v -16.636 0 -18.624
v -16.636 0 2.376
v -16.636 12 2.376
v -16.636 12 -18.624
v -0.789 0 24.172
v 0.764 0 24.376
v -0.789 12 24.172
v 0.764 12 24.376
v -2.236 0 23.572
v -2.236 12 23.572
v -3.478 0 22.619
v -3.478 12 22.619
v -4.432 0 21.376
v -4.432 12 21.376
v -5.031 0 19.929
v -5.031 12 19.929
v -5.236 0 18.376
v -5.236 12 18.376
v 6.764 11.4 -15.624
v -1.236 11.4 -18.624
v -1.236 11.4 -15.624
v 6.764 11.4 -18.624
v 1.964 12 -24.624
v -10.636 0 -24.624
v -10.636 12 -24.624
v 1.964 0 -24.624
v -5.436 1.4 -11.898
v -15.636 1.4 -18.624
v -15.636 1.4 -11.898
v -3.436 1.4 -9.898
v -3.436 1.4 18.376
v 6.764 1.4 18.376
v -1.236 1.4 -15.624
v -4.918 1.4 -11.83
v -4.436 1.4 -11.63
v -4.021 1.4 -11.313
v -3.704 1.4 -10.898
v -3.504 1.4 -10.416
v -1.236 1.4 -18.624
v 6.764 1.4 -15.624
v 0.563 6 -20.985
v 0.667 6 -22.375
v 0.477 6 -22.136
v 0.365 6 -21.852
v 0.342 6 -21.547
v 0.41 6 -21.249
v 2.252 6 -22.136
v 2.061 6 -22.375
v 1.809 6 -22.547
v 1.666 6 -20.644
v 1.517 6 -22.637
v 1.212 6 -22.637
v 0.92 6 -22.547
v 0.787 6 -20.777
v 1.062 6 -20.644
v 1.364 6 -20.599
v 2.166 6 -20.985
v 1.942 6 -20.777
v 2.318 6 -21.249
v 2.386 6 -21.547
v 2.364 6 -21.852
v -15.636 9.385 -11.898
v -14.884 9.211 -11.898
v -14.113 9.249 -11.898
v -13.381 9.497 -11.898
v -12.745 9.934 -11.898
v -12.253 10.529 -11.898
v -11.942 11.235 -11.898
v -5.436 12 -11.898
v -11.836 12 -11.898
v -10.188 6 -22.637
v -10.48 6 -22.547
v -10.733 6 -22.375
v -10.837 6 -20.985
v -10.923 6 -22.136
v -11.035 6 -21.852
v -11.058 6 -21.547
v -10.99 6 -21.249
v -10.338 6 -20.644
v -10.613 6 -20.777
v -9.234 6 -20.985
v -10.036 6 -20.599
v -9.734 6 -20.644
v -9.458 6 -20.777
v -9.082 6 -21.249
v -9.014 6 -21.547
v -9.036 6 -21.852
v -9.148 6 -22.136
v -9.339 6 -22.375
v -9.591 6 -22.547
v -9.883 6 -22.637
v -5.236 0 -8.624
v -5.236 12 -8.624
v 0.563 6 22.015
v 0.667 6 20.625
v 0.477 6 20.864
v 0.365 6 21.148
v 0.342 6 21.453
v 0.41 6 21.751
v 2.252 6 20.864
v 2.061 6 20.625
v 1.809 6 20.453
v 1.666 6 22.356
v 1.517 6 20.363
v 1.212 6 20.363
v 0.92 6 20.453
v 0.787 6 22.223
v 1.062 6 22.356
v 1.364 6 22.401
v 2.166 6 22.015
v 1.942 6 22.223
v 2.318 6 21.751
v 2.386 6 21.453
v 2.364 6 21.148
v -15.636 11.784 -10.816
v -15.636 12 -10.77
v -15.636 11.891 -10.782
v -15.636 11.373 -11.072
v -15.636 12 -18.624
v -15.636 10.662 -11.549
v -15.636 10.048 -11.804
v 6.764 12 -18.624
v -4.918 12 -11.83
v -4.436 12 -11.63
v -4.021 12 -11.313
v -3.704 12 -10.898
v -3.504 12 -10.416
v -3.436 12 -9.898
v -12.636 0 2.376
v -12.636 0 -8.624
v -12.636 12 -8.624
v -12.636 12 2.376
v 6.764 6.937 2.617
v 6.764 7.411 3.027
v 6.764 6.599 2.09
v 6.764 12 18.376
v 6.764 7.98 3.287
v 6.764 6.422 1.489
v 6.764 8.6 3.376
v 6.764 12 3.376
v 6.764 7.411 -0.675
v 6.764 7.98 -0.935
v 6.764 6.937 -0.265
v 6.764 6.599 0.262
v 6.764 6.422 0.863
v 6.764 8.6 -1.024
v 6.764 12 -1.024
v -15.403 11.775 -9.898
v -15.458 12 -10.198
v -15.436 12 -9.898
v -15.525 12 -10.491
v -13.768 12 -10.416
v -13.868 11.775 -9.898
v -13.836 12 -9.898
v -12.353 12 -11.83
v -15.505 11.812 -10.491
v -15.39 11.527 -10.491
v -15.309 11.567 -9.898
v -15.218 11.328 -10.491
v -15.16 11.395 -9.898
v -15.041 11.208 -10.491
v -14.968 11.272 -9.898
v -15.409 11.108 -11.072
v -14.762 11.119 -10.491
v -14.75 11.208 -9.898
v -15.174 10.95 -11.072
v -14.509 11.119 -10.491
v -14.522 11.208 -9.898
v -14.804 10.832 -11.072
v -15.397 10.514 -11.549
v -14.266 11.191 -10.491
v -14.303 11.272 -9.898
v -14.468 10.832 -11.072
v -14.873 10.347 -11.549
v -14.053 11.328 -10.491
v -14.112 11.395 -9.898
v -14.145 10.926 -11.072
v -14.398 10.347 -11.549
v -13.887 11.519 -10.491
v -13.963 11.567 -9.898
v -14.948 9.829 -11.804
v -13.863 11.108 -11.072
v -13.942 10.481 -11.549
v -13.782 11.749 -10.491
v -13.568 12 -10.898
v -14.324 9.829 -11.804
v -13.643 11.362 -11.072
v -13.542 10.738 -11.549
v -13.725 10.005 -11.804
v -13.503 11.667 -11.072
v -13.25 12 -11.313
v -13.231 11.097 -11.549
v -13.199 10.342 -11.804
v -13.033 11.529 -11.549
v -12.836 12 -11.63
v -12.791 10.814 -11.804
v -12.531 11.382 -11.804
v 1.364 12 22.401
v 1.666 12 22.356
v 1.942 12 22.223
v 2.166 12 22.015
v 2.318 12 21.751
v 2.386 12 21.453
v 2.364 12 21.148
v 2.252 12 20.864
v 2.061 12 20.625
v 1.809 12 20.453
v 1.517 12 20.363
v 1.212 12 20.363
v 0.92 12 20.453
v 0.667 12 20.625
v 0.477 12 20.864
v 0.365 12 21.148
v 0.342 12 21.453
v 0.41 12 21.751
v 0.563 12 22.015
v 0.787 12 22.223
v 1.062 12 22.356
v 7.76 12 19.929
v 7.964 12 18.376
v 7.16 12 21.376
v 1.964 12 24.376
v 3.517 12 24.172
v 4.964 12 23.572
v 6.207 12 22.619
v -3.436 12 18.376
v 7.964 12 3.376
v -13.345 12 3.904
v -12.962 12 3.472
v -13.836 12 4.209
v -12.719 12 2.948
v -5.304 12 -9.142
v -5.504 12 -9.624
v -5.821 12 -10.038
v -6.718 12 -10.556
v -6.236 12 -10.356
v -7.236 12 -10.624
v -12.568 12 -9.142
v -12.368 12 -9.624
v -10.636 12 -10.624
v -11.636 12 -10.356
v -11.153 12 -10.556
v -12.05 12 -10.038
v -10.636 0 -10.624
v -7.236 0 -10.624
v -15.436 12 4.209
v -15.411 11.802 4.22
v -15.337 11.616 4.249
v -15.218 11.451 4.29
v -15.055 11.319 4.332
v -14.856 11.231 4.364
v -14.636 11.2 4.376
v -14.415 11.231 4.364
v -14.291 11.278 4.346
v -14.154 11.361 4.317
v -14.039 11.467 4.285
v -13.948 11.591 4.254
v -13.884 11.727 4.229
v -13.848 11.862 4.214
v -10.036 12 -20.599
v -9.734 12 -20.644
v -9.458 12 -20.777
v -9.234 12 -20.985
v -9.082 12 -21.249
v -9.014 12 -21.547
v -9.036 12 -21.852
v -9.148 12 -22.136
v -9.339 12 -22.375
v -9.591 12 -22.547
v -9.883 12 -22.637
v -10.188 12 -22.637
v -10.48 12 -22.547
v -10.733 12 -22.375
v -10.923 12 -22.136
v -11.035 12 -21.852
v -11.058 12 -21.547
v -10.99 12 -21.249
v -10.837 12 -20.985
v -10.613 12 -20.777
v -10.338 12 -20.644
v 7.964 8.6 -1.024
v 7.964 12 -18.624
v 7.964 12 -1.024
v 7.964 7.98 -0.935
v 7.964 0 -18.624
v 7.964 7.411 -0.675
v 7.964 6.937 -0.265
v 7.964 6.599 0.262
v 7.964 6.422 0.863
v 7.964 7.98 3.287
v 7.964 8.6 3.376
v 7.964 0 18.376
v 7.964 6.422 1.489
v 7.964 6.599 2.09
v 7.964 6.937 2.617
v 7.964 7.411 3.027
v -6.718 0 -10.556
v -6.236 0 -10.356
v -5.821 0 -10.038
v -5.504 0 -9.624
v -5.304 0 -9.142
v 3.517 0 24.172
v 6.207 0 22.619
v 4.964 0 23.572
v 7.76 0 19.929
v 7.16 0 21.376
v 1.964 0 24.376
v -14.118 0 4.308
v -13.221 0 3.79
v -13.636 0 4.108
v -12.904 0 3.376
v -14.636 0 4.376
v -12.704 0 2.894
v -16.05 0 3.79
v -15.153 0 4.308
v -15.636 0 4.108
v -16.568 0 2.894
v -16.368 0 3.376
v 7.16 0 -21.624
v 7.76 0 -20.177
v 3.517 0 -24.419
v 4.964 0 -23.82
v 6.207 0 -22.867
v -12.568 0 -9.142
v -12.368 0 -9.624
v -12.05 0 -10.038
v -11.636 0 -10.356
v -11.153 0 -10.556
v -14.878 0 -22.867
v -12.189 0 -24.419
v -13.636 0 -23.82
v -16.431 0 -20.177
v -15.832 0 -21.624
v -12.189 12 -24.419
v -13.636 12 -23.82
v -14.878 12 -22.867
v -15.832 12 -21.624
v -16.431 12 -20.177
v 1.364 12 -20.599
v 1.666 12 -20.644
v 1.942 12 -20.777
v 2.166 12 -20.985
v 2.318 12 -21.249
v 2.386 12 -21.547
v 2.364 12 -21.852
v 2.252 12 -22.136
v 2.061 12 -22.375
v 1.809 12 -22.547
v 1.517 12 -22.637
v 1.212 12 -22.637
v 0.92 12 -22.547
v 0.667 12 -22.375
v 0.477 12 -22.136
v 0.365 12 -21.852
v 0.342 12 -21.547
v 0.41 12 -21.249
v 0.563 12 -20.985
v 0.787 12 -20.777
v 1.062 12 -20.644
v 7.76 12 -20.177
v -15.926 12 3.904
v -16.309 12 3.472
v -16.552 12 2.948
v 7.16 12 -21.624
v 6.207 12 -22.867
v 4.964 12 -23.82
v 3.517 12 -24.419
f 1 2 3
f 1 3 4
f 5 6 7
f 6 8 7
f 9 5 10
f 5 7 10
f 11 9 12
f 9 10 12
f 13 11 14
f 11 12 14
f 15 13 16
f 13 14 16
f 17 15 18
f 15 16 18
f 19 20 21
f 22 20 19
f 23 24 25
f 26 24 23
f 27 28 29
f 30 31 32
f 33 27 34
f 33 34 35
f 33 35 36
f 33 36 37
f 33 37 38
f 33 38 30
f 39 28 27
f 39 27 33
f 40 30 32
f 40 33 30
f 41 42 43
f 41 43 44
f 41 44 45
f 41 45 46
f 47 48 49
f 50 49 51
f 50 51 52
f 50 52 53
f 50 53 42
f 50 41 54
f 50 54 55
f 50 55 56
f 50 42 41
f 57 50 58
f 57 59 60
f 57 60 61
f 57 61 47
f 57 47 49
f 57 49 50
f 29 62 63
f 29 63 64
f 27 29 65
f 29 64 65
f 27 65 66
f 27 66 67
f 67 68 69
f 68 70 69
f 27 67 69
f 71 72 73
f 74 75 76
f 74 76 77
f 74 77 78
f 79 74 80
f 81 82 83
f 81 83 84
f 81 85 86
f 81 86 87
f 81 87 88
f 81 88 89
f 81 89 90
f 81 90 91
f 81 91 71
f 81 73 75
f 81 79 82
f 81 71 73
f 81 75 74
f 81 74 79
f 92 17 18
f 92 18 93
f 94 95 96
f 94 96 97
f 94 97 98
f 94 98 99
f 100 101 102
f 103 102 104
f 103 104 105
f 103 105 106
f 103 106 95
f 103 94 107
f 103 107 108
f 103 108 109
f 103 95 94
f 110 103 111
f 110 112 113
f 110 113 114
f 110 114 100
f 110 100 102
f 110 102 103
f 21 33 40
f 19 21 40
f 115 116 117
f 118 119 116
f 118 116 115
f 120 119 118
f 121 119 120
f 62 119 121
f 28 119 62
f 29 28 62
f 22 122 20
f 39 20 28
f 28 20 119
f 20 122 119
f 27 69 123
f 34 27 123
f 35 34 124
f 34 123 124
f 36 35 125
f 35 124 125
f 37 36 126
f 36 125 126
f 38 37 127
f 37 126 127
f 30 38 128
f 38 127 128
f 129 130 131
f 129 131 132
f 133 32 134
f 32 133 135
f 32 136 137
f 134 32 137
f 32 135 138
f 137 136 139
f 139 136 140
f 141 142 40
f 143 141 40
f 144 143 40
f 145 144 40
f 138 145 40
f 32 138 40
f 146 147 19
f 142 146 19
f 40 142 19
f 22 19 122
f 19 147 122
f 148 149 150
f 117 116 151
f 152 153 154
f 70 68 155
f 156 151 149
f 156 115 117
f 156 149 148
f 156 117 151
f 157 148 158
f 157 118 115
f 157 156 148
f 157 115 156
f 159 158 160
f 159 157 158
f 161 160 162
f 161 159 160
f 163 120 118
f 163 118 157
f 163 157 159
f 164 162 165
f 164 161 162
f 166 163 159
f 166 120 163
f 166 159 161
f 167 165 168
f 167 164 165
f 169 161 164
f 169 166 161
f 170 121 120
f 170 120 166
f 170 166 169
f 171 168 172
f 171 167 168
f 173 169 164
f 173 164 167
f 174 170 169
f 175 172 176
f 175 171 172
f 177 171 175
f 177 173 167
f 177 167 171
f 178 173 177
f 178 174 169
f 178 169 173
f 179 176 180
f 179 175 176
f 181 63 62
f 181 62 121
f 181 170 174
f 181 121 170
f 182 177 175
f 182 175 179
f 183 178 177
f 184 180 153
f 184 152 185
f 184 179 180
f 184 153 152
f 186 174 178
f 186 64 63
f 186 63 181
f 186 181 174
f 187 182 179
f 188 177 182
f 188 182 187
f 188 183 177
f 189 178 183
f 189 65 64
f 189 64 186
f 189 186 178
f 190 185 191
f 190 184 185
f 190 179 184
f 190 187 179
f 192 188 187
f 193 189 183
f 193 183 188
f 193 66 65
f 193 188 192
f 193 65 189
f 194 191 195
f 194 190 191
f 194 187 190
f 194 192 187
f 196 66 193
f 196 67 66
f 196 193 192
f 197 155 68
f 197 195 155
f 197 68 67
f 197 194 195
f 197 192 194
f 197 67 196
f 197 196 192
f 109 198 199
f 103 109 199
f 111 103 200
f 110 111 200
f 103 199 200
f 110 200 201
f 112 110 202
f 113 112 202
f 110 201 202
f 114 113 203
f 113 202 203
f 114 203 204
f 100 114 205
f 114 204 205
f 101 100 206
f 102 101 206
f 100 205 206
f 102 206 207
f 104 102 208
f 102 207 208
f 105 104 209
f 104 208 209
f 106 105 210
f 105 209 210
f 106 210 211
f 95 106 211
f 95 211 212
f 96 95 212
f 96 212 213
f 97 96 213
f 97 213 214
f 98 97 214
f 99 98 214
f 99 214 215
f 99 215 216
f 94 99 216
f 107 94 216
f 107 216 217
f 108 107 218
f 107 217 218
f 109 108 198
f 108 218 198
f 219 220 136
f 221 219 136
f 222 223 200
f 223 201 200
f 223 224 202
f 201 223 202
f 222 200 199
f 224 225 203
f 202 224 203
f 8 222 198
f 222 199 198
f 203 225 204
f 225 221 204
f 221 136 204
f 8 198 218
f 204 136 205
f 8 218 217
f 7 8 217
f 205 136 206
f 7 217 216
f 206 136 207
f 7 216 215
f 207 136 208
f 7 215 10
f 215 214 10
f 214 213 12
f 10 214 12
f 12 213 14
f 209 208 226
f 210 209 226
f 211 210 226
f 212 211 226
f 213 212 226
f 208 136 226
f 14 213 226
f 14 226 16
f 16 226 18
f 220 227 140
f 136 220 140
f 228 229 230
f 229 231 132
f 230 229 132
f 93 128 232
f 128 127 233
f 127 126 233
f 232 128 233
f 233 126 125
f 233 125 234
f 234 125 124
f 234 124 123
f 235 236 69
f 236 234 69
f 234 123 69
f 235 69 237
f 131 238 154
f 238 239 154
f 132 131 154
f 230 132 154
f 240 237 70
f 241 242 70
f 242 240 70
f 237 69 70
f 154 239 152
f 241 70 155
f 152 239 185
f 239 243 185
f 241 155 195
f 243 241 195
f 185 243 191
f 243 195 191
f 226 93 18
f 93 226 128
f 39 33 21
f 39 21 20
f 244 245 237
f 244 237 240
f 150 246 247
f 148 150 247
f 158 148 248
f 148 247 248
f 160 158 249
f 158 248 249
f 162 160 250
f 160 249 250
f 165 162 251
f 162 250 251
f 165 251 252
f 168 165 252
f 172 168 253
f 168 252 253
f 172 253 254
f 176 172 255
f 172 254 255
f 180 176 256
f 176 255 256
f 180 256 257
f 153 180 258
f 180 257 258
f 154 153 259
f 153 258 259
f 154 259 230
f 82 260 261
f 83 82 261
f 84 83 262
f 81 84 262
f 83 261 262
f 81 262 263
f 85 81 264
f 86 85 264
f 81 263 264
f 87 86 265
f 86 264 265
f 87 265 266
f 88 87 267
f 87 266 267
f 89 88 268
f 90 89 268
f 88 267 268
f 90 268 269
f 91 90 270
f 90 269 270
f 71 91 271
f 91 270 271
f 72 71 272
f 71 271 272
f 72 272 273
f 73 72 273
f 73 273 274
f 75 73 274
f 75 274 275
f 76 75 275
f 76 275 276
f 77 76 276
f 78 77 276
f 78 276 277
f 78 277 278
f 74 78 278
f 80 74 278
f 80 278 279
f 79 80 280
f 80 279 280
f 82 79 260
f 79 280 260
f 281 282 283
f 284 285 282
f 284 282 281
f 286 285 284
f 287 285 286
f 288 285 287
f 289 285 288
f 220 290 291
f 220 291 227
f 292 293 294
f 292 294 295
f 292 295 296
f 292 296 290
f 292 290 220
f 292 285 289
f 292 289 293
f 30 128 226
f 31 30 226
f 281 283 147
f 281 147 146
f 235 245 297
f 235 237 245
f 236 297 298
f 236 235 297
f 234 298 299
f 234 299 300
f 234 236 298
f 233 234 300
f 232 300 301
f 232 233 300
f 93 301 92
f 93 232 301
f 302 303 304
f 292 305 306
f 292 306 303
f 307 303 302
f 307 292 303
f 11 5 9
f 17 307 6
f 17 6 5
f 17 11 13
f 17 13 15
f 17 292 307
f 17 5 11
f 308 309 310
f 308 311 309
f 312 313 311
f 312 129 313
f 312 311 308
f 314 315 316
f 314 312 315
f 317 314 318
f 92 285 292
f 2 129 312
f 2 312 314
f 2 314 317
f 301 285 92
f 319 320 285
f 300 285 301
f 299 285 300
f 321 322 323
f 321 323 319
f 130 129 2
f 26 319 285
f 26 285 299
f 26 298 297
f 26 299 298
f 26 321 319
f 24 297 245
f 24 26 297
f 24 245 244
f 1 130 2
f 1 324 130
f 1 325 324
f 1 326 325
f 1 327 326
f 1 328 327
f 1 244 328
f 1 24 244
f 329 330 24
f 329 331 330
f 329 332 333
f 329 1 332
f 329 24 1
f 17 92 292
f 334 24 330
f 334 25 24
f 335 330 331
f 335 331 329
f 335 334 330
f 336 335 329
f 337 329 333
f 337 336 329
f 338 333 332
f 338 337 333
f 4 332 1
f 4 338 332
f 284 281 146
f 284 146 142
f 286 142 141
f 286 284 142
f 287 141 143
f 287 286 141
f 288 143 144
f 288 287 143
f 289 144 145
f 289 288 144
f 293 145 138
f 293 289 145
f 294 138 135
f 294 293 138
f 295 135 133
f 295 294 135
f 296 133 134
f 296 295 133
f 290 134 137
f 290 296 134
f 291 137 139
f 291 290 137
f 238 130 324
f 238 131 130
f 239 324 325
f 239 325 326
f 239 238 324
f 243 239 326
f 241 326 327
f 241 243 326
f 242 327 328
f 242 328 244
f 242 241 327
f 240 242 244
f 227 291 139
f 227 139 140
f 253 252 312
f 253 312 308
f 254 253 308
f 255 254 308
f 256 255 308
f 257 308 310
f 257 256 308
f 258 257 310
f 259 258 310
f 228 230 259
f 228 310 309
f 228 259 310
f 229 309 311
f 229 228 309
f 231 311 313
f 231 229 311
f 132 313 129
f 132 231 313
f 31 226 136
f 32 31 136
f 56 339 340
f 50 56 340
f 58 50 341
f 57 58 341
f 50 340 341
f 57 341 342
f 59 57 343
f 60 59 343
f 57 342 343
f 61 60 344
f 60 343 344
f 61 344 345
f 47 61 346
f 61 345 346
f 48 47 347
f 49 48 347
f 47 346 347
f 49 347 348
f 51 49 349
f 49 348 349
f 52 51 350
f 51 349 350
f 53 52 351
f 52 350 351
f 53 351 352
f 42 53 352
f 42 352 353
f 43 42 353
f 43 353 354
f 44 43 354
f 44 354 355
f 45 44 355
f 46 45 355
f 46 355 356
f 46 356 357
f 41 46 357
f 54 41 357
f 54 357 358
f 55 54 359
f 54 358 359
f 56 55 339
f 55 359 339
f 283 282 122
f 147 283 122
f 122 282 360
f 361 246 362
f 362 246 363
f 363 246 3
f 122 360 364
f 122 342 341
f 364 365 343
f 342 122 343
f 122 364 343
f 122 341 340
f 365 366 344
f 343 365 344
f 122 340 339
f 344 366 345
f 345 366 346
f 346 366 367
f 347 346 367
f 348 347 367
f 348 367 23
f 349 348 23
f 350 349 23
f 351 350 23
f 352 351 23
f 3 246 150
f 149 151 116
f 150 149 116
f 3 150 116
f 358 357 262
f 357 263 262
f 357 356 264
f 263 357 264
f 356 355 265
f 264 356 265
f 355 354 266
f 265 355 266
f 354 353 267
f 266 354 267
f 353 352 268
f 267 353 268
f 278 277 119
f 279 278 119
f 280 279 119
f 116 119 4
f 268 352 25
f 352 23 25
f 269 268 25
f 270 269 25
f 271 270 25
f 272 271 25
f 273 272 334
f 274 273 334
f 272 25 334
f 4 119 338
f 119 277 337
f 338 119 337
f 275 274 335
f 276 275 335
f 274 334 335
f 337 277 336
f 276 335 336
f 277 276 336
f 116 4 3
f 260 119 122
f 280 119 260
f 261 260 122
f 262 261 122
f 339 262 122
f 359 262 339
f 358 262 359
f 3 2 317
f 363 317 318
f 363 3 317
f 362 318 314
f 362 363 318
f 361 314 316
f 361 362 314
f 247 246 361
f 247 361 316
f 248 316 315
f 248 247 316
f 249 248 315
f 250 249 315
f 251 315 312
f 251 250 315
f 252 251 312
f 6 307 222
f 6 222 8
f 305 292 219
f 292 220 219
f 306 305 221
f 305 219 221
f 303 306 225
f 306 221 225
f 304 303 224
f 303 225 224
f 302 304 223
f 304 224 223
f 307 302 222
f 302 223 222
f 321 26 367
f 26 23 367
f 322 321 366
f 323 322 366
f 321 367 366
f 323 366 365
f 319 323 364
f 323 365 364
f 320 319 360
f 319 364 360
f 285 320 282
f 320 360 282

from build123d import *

# Parameters (mm, degrees)
BOSS_EXTRUDE1_DEPTH = 12
CUT_EXTRUDE1_DEPTH  = 10.6
SKETCH3_R           = 0.8
CUT_EXTRUDE2_DEPTH  = 16.274572476
SKETCH4_R           = 1.025
CUT_EXTRUDE3_DEPTH  = 6
FILLET1_R           = 6
FILLET2_R           = 2
CUT_EXTRUDE4_DEPTH  = 1.2
FILLET3_R           = 2
SKETCH6_W           = 8
SKETCH6_H           = 3
BOSS_EXTRUDE2_DEPTH = 10


# Some blends are built 0.0001 mm under size
with BuildPart() as part:
    # Sketch1 → Boss-Extrude1 (new body)
    with BuildSketch(Plane(origin=(0, 0, 0), x_dir=(1, 0, 0), z_dir=(0, 1, 0))):
        Polygon((-16.635707691, 24.623874564), (7.964292309, 24.623874564), (7.964292309, -24.376125436), (-5.235707691, -24.376125436), (-5.235707691, 10.623874564), (-12.635707691, 10.623874564), (-12.635707691, -4.376125436), (-16.635707691, -4.376125436), align=None)
    extrude(amount=BOSS_EXTRUDE1_DEPTH)

    # Sketch2 → Cut-Extrude1 (cut)
    with BuildSketch(Plane(origin=(0, 12, 0), x_dir=(1, 0, 0), z_dir=(0, 1, 0))):
        Polygon((-3.435707691, -18.376125436), (6.764292309, -18.376125436), (6.764292309, 18.623874564), (-15.635707691, 18.623874564), (-15.635707691, 11.89844704), (-3.435707691, 11.89844704), align=None)
    extrude(amount=-CUT_EXTRUDE1_DEPTH, mode=Mode.SUBTRACT)

    # Sketch3 → Cut-Extrude2 (cut)
    with BuildSketch(Plane.XY.offset(4.376125436)):
        with Locations((-14.635707691, 12)):
            Circle(SKETCH3_R)
    extrude(amount=-CUT_EXTRUDE2_DEPTH, mode=Mode.SUBTRACT)

    # Sketch4 → Cut-Extrude3 (cut)
    with BuildSketch(Plane(origin=(0, 12, 0), x_dir=(1, 0, 0), z_dir=(0, 1, 0))):
        with Locations(Location((-10.035707691, 21.623874564, 0), (0, 0, 270))):
            Circle(SKETCH4_R)
        with Locations(Location((1.364292309, 21.623874564, 0), (0, 0, 270))):
            Circle(SKETCH4_R)
        with Locations(Location((1.364292309, -21.376125436, 0), (0, 0, 270))):
            Circle(SKETCH4_R)
    extrude(amount=-CUT_EXTRUDE3_DEPTH, mode=Mode.SUBTRACT)

    # Fillet1
    fillet1_edges = [part.edges().sort_by_distance(p)[0] for p in [
        (-16.635707691, 6, -24.623874564),
        (7.964292309, 6, -24.623874564),
        (7.964292309, 6, 24.376125436),
        (-5.235707691, 6, 24.376125436),
    ]]
    fillet(fillet1_edges, radius=FILLET1_R)

    # Fillet2
    fillet2_edges = [part.edges().sort_by_distance(p)[0] for p in [
        (-5.235707691, 6, -10.623874564),
        (-12.635707691, 6, -10.623874564),
        (-12.635707691, 6, 4.376125436),
        (-16.635707691, 6, 4.376125436),
    ]]
    fillet(fillet2_edges, radius=FILLET2_R - 0.0001)  # a hair under: the kernel refuses the full size

    # Sketch5 → Cut-Extrude4 (cut)
    with BuildSketch(Plane(origin=(7.964292309, 0, 0), x_dir=(0, 0, -1), z_dir=(1, 0, 0))):
        with BuildLine():
            Line((-3.376125436, 8.6), (-3.376125436, 12))
            Line((-3.376125436, 12), (1.023874564, 12))
            Line((1.023874564, 12), (1.023874564, 8.6))
            ThreePointArc((1.023874564, 8.6), (-1.176125436, 6.4), (-3.376125436, 8.6))
        make_face()
    extrude(amount=-CUT_EXTRUDE4_DEPTH, mode=Mode.SUBTRACT)

    # Fillet3
    # the kernel refuses this fillet: 2 mm, written as the material it takes off along each edge
    with BuildSketch(Plane(origin=(-3.435707691, 17, -11.89844704), x_dir=(-1, 0, 0), z_dir=(0, -1, 0))) as fillet3_piece_1:
        with BuildLine():
            CenterArc((FILLET3_R, -FILLET3_R), FILLET3_R, 90, 90)
            Line((0, -FILLET3_R), (0, 0))
            Line((0, 0), (FILLET3_R, 0))
        make_face()
    extrude(amount=15.6, mode=Mode.SUBTRACT)
    with BuildSketch(Plane(origin=(-14.635707691, 12, -11.89844704), x_dir=(-0.0031415874858797778, 0.9999950652018582, 0), z_dir=(0.9999950652018582, 0.0031415874858797778, 0))) as fillet3_piece_2_section:
        with BuildLine():
            CenterArc((0.8 + FILLET3_R, 0 + FILLET3_R), FILLET3_R, 180, 90)
            Line((0.8 + FILLET3_R, 0), (0.8, 0))
            Line((0.8, 0), (0.8, 0 + FILLET3_R))
        make_face()
    fillet3_piece_2 = revolve(axis=Axis((-14.635707691, 12, -11.89844704), (0, 0, 1)), revolution_arc=359.64, mode=Mode.PRIVATE)
    fillet3_piece_2 = split(fillet3_piece_2, bisect_by=Plane(origin=(-15.635707691, 11.089592245, -11.483446459), z_dir=(1, 0, 0)), keep=Keep.TOP, mode=Mode.PRIVATE)
    add(fillet3_piece_2, mode=Mode.SUBTRACT)

    # Sketch6 → Boss-Extrude2 (add)
    with BuildSketch(Plane(origin=(0, 1.4, 0), x_dir=(1, 0, 0), z_dir=(0, 1, 0))):
        with Locations((2.764292309, 17.123874564)):
            Rectangle(SKETCH6_W, SKETCH6_H)
    extrude(amount=BOSS_EXTRUDE2_DEPTH)


solid = part.part
